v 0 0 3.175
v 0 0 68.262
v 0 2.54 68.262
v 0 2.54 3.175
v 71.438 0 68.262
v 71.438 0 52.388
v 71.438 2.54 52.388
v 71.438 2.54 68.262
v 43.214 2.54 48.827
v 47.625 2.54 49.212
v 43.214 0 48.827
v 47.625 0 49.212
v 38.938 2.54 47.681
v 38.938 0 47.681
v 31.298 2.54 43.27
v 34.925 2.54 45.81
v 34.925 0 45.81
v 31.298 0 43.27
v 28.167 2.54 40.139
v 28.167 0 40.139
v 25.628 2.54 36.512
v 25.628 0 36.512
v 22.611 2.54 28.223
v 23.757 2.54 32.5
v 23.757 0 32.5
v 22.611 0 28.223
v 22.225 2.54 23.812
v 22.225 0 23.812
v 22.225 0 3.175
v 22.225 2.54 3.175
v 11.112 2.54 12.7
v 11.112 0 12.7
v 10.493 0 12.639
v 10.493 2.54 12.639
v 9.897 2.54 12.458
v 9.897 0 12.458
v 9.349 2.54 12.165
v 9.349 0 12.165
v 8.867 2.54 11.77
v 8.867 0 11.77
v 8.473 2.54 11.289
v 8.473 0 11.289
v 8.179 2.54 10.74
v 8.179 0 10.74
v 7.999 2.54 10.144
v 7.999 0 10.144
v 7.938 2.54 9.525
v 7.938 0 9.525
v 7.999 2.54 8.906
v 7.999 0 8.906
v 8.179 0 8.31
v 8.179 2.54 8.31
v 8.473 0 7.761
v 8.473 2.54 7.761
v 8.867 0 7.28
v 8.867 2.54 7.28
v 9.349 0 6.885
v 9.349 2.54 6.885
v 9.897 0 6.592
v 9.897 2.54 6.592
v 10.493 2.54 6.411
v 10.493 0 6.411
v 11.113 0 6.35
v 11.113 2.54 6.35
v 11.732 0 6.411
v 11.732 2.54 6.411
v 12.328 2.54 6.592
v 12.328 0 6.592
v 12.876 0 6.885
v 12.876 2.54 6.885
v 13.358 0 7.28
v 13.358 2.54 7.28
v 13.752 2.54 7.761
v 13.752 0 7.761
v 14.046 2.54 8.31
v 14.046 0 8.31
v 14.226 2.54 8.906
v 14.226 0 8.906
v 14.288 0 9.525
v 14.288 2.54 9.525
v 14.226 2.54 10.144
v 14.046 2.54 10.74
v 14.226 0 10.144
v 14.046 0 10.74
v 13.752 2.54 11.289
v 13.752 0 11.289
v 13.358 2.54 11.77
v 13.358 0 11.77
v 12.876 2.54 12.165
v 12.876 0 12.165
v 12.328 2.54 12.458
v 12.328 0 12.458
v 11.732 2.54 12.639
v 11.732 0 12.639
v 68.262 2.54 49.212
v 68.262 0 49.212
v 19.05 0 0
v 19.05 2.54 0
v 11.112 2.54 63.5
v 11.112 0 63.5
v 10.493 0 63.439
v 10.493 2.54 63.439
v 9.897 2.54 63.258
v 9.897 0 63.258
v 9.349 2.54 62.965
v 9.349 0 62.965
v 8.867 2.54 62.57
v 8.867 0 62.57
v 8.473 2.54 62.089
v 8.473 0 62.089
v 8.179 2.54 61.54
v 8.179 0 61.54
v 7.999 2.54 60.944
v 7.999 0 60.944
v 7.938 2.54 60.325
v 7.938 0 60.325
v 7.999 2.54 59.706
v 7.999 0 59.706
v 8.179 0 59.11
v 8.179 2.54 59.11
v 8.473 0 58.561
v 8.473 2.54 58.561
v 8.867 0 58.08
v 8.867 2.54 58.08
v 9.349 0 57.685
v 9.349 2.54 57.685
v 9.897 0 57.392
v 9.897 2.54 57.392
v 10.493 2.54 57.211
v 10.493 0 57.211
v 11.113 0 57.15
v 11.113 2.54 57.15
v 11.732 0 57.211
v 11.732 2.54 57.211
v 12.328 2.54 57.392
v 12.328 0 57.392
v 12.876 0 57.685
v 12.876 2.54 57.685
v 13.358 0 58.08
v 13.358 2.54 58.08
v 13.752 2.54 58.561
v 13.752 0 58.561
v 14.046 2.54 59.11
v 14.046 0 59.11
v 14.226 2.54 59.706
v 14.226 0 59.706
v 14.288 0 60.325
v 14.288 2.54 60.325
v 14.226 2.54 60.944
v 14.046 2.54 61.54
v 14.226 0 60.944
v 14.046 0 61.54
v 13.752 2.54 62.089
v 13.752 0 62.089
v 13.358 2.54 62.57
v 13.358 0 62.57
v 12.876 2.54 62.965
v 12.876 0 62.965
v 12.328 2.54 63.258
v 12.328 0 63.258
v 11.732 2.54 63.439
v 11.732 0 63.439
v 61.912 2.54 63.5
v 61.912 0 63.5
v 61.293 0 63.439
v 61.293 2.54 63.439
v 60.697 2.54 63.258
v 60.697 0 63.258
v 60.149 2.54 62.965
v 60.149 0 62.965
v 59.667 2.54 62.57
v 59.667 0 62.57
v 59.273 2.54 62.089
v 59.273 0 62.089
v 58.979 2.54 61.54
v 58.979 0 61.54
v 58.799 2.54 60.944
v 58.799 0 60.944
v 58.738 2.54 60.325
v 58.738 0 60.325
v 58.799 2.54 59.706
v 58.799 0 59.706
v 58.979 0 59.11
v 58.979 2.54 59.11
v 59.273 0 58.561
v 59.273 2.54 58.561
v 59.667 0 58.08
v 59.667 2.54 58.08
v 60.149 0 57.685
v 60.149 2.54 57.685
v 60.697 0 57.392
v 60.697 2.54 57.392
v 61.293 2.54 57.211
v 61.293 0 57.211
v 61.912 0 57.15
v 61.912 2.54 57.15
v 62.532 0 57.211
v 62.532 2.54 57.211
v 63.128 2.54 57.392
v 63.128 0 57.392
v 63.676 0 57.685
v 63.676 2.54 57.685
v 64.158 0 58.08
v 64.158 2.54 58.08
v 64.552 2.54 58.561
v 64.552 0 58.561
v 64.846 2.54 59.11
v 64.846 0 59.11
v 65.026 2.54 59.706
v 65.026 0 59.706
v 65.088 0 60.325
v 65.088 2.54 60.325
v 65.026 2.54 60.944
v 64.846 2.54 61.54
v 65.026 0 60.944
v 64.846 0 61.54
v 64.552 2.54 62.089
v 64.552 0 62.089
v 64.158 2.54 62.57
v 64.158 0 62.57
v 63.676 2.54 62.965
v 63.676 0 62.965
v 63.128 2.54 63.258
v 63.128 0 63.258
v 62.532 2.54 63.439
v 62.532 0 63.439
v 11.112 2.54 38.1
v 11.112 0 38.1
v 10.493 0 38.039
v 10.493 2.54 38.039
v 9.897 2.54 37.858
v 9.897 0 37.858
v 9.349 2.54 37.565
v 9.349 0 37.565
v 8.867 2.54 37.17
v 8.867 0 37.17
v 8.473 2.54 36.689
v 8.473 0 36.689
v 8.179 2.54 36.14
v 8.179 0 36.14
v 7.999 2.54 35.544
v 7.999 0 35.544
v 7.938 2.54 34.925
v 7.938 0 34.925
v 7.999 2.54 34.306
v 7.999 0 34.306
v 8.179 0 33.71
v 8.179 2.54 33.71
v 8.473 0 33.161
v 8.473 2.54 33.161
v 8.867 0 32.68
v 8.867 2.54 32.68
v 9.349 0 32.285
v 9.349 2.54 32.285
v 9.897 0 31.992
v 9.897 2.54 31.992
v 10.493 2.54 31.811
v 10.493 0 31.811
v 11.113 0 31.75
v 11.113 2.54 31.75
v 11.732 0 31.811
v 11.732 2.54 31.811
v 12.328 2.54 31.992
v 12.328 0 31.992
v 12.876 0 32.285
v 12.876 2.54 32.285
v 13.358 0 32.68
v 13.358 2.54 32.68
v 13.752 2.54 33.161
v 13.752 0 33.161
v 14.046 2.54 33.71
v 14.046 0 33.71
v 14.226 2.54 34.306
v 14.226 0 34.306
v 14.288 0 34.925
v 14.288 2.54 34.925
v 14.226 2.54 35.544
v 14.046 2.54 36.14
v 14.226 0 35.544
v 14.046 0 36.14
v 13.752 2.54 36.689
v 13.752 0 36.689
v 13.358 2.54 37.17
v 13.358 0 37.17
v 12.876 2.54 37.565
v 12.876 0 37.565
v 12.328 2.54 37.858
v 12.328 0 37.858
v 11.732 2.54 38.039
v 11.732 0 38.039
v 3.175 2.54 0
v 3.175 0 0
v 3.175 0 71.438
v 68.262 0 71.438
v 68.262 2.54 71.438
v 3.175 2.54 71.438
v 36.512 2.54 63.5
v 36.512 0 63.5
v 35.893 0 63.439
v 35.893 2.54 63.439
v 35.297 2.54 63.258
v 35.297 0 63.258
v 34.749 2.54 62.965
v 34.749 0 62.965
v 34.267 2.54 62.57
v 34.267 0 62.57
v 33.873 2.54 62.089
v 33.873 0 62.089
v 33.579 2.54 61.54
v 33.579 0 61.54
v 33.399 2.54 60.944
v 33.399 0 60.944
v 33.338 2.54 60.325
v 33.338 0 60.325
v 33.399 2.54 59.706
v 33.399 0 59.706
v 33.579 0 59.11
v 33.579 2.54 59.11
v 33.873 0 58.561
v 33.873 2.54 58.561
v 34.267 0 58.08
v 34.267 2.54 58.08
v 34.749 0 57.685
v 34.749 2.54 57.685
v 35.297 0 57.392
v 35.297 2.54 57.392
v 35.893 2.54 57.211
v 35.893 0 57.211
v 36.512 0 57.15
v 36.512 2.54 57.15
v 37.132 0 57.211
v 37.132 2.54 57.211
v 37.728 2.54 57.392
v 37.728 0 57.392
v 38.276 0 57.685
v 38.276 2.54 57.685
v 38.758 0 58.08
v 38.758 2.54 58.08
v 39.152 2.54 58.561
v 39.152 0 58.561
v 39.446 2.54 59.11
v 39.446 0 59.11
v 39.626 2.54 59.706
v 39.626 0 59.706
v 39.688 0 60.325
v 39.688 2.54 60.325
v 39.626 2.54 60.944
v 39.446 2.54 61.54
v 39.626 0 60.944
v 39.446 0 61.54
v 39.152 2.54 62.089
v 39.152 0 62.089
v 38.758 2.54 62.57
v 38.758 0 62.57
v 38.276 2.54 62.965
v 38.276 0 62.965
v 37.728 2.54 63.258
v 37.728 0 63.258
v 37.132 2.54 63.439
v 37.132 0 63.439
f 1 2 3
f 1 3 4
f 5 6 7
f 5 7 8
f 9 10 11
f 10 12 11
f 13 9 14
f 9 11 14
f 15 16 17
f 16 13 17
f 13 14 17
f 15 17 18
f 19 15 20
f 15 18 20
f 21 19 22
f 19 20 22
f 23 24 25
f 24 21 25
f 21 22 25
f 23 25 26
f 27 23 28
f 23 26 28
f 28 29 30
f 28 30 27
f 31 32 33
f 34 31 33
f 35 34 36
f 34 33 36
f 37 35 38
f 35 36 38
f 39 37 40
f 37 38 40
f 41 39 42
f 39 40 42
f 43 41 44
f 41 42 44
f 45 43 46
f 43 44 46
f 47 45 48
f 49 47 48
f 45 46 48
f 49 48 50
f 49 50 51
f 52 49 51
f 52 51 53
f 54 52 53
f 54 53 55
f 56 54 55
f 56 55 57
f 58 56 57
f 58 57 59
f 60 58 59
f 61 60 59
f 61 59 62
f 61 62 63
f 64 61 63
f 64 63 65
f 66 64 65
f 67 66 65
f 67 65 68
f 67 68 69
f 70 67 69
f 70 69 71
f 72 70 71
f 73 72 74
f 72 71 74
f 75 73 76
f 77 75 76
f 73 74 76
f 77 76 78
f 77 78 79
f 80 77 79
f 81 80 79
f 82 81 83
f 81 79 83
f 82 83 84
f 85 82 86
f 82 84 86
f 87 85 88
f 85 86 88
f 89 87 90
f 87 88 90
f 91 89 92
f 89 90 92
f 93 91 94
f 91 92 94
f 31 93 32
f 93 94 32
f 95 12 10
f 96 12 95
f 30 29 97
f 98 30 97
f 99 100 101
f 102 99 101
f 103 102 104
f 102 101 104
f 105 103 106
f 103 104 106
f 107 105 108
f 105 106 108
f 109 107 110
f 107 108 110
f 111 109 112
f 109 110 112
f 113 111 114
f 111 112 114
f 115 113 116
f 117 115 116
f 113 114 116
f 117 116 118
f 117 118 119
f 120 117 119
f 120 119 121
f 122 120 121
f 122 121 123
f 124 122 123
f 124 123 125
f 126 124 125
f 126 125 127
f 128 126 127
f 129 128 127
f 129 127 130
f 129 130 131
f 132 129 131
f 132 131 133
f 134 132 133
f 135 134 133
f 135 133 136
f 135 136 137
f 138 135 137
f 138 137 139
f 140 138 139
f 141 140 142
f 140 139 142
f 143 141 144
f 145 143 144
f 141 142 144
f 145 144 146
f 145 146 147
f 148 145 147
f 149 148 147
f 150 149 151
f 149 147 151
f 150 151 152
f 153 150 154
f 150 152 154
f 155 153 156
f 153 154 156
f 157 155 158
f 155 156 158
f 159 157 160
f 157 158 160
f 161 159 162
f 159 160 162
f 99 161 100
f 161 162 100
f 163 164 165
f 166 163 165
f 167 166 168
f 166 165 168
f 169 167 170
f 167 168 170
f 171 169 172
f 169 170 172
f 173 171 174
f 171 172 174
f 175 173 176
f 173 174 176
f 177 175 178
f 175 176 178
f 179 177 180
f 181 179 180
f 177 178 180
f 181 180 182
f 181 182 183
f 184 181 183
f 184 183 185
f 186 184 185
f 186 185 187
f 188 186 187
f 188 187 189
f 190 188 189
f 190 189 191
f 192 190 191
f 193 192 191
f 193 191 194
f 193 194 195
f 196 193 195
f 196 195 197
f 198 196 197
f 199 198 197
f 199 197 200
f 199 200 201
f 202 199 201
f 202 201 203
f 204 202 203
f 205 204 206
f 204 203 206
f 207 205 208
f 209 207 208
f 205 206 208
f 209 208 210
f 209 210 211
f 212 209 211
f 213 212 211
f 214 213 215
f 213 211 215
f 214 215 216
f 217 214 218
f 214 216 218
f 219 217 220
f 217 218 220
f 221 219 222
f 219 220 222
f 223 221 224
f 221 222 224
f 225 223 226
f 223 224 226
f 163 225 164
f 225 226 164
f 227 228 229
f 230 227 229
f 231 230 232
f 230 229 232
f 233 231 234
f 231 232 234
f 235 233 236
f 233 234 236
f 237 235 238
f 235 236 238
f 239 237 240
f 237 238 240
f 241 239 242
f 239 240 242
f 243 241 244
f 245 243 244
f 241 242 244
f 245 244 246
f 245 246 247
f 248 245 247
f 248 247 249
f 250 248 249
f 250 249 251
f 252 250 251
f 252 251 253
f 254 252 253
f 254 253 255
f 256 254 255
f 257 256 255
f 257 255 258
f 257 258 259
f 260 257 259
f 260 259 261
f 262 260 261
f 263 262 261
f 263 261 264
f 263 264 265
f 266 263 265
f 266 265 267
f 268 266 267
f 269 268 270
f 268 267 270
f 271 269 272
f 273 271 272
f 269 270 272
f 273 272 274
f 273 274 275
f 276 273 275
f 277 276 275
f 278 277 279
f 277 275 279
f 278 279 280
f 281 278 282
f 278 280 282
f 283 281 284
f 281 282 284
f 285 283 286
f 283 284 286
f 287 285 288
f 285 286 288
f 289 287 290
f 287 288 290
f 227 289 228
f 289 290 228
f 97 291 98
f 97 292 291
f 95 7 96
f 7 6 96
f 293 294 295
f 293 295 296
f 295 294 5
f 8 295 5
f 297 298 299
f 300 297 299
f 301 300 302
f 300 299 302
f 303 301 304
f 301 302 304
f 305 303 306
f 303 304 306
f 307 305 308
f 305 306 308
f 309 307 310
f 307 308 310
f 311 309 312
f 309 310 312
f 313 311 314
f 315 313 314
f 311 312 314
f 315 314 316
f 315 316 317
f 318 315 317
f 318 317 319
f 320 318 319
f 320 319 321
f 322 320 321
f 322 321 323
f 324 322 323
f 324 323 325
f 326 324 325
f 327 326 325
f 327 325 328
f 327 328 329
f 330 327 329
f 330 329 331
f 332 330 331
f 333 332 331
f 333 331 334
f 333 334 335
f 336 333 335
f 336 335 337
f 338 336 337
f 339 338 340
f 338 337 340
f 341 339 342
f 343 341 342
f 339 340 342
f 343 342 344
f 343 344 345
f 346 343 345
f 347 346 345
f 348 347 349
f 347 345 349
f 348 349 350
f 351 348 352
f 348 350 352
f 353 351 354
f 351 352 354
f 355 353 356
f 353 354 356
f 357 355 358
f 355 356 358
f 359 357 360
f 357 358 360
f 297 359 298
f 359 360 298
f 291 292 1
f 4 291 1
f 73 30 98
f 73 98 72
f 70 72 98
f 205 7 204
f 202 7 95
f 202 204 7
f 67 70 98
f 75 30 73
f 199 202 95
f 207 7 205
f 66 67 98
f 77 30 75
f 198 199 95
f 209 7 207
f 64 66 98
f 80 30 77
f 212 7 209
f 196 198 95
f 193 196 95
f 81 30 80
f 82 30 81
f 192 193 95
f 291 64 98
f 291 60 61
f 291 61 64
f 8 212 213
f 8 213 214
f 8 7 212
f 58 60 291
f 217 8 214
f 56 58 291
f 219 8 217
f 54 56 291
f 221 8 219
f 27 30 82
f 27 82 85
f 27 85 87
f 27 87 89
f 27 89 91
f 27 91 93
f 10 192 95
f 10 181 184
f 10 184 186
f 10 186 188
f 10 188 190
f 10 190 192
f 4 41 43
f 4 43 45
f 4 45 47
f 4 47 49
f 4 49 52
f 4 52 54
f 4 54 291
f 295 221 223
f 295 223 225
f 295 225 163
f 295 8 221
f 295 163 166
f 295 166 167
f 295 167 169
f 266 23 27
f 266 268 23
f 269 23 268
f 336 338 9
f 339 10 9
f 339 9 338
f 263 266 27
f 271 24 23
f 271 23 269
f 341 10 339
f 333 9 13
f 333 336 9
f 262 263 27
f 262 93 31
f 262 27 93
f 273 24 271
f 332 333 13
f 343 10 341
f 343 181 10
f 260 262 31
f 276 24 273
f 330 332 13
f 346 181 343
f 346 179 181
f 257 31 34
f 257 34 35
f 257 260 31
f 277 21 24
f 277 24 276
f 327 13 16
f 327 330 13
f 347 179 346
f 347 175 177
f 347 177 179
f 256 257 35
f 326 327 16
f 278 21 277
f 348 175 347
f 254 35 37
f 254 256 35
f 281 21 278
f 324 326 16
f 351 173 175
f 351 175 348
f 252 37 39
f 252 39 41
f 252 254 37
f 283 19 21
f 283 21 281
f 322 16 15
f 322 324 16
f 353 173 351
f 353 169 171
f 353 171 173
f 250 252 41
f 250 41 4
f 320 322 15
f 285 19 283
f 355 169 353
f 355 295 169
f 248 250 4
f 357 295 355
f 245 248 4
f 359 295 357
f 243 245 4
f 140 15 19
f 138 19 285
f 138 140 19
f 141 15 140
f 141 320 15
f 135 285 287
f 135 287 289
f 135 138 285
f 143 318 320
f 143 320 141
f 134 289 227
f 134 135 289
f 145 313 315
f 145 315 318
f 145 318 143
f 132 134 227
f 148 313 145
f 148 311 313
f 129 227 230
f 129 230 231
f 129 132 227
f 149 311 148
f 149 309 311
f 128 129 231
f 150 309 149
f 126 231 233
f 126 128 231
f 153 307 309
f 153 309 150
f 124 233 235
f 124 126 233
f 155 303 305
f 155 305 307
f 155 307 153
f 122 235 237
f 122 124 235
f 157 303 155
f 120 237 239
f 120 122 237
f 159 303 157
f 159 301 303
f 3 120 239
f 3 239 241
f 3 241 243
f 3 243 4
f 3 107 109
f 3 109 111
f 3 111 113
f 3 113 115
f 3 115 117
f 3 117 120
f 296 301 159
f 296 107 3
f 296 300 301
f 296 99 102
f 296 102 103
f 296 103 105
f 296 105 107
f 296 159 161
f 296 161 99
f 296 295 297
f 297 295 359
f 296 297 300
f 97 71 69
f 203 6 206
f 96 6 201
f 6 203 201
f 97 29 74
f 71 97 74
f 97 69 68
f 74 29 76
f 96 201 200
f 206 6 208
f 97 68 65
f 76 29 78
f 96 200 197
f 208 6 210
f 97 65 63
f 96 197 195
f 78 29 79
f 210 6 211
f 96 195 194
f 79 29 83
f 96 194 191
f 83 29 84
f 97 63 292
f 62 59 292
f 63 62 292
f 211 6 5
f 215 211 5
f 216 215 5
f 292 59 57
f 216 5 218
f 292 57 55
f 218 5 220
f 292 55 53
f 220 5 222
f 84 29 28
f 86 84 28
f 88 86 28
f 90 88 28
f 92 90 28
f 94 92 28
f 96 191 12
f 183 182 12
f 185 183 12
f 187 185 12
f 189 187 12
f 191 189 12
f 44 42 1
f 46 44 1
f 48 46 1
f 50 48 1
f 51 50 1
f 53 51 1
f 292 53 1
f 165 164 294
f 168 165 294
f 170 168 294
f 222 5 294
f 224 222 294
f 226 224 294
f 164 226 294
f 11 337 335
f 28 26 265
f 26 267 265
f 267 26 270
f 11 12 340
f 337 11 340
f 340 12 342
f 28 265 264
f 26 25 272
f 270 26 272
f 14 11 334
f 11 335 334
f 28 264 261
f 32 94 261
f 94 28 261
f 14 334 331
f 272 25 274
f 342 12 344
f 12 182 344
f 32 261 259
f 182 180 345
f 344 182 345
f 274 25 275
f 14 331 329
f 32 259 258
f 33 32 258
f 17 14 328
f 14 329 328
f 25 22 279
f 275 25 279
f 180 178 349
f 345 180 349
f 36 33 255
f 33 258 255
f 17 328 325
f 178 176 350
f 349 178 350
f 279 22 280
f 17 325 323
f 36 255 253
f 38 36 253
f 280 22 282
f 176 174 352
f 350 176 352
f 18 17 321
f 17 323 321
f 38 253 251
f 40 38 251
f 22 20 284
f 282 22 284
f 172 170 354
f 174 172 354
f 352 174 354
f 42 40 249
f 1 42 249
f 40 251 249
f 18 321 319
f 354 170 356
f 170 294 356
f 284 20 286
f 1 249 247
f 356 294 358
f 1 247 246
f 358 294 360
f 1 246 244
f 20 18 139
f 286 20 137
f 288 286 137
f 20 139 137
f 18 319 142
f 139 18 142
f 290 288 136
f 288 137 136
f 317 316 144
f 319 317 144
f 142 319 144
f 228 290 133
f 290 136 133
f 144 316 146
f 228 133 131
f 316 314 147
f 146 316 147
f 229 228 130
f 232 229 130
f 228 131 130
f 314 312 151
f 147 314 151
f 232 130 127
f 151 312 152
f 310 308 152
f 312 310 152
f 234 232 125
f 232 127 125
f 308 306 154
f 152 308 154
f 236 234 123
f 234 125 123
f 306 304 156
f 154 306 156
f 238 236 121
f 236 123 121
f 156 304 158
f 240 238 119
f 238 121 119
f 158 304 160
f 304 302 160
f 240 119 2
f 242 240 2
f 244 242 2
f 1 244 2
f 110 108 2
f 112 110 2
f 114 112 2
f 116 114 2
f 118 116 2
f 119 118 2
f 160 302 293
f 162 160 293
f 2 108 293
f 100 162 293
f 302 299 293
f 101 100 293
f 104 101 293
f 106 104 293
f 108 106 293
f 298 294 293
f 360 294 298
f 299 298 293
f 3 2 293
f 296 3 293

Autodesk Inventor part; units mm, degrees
ref_plane "YZ Plane" through (0, 0, 0) normal (1, 0, 0) x (0, 1, 0)
ref_plane "XZ Plane" through (0, 0, 0) normal (0, 1, 0) x (-1, 0, 0)
ref_plane "XY Plane" through (0, 0, 0) normal (0, 0, 1) x (1, 0, 0)
sketch "Sketch1" plane through (0, 0, 0) normal (0, 1, 0) x (-1, 0, 0)
  line L0 (-3.175, 0) -> (-19.05, 0)
  line L1 (-71.4375, 52.3875) -> (-71.4375, 68.2625)
  line L2 (-68.2625, 71.4375) -> (-3.175, 71.4375)
  line L3 (0, 68.2625) -> (0, 3.175)
  line L4 (-3.175, 0) -> (0, 3.175)
  line L5 (0, 68.2625) -> (-3.175, 71.4375)
  line L6 (-68.2625, 71.4375) -> (-71.4375, 68.2625)
  line L7 (-22.225, 3.175) -> (-22.225, 23.8125)
  line L8 (-47.625, 49.2125) -> (-68.2625, 49.2125)
  arc A0 (-22.225, 23.8125) -> (-47.625, 49.2125) centre (-47.625, 23.8125) ccw
  line L9 (-22.225, 3.175) -> (-19.05, 0)
  line L10 (-71.4375, 52.3875) -> (-68.2625, 49.2125)
  point P0 (0, 0)
  point P1 (-71.4375, 71.4375)
  point P2 (0, 71.4375)
  point P3 (-22.225, 49.2125)
  point P4 (-22.225, 0)
  point P5 (-71.4375, 49.2125)
  dimension "d0" = 71.4375
  dimension "d2" = 3.175
  dimension "d3" = 3.175
  dimension "d4" = 3.175
  dimension "d5" = 3.175
  dimension "d6" = 3.175
  dimension "d7" = 3.175
  dimension "d11" = 3.175
  dimension "d12" = 3.175
  dimension "d13" = 3.175
  dimension "d14" = 3.175
  dimension "d32" = 15.875
  dimension "d35" = 15.875
  dimension "d37" = 71.4375
  dimension "d38" = 25.4
  dimension "d39" = 47.625
  dimension "d40" = 47.625
extrude "Extrusion1" add sketch "Sketch1" along normal blind 2.54
hole "Hole1" at (11.1125, 2.54, 60.325) direction (0, -1, 0) diameter 6.35 end through all
pattern_linear "Rectangular Pattern1" count 3 spacing 25.4 along (0, 0, -1) of "Hole1"
pattern_linear "Rectangular Pattern2" count 3 spacing 25.4 along (1, 0, 0) of "Hole1"
equation "\"d3\" = d2"
equation "\"d4\" = d2"
equation "\"d5\" = d4"
equation "\"d6\" = d2"
equation "\"d7\" = d6"
equation "\"d12\" = d11"
equation "\"d13\" = d11"
equation "\"d14\" = d13"
equation "\"d35\" = d32"
equation "\"d37\" = d0"
equation "\"d40\" = d39"
equation "\"BendRadius\" = Thickness"
equation "\"BendReliefWidth\" = Thickness"
equation "\"BendReliefDepth\" = 0.5 * Thickness"
equation "\"CornerReliefSize\" = 4 * Thickness"
equation "\"MinimumRemnant\" = 2 * Thickness"
equation "\"TransitionRadius\" = BendRadius"
equation "\"JacobiRadiusSize\" = Thickness"
equation "\"GapSize\" = Thickness"
equation "\"Thickness\" = 3.048"
properties part number "3x3 Gusset"
